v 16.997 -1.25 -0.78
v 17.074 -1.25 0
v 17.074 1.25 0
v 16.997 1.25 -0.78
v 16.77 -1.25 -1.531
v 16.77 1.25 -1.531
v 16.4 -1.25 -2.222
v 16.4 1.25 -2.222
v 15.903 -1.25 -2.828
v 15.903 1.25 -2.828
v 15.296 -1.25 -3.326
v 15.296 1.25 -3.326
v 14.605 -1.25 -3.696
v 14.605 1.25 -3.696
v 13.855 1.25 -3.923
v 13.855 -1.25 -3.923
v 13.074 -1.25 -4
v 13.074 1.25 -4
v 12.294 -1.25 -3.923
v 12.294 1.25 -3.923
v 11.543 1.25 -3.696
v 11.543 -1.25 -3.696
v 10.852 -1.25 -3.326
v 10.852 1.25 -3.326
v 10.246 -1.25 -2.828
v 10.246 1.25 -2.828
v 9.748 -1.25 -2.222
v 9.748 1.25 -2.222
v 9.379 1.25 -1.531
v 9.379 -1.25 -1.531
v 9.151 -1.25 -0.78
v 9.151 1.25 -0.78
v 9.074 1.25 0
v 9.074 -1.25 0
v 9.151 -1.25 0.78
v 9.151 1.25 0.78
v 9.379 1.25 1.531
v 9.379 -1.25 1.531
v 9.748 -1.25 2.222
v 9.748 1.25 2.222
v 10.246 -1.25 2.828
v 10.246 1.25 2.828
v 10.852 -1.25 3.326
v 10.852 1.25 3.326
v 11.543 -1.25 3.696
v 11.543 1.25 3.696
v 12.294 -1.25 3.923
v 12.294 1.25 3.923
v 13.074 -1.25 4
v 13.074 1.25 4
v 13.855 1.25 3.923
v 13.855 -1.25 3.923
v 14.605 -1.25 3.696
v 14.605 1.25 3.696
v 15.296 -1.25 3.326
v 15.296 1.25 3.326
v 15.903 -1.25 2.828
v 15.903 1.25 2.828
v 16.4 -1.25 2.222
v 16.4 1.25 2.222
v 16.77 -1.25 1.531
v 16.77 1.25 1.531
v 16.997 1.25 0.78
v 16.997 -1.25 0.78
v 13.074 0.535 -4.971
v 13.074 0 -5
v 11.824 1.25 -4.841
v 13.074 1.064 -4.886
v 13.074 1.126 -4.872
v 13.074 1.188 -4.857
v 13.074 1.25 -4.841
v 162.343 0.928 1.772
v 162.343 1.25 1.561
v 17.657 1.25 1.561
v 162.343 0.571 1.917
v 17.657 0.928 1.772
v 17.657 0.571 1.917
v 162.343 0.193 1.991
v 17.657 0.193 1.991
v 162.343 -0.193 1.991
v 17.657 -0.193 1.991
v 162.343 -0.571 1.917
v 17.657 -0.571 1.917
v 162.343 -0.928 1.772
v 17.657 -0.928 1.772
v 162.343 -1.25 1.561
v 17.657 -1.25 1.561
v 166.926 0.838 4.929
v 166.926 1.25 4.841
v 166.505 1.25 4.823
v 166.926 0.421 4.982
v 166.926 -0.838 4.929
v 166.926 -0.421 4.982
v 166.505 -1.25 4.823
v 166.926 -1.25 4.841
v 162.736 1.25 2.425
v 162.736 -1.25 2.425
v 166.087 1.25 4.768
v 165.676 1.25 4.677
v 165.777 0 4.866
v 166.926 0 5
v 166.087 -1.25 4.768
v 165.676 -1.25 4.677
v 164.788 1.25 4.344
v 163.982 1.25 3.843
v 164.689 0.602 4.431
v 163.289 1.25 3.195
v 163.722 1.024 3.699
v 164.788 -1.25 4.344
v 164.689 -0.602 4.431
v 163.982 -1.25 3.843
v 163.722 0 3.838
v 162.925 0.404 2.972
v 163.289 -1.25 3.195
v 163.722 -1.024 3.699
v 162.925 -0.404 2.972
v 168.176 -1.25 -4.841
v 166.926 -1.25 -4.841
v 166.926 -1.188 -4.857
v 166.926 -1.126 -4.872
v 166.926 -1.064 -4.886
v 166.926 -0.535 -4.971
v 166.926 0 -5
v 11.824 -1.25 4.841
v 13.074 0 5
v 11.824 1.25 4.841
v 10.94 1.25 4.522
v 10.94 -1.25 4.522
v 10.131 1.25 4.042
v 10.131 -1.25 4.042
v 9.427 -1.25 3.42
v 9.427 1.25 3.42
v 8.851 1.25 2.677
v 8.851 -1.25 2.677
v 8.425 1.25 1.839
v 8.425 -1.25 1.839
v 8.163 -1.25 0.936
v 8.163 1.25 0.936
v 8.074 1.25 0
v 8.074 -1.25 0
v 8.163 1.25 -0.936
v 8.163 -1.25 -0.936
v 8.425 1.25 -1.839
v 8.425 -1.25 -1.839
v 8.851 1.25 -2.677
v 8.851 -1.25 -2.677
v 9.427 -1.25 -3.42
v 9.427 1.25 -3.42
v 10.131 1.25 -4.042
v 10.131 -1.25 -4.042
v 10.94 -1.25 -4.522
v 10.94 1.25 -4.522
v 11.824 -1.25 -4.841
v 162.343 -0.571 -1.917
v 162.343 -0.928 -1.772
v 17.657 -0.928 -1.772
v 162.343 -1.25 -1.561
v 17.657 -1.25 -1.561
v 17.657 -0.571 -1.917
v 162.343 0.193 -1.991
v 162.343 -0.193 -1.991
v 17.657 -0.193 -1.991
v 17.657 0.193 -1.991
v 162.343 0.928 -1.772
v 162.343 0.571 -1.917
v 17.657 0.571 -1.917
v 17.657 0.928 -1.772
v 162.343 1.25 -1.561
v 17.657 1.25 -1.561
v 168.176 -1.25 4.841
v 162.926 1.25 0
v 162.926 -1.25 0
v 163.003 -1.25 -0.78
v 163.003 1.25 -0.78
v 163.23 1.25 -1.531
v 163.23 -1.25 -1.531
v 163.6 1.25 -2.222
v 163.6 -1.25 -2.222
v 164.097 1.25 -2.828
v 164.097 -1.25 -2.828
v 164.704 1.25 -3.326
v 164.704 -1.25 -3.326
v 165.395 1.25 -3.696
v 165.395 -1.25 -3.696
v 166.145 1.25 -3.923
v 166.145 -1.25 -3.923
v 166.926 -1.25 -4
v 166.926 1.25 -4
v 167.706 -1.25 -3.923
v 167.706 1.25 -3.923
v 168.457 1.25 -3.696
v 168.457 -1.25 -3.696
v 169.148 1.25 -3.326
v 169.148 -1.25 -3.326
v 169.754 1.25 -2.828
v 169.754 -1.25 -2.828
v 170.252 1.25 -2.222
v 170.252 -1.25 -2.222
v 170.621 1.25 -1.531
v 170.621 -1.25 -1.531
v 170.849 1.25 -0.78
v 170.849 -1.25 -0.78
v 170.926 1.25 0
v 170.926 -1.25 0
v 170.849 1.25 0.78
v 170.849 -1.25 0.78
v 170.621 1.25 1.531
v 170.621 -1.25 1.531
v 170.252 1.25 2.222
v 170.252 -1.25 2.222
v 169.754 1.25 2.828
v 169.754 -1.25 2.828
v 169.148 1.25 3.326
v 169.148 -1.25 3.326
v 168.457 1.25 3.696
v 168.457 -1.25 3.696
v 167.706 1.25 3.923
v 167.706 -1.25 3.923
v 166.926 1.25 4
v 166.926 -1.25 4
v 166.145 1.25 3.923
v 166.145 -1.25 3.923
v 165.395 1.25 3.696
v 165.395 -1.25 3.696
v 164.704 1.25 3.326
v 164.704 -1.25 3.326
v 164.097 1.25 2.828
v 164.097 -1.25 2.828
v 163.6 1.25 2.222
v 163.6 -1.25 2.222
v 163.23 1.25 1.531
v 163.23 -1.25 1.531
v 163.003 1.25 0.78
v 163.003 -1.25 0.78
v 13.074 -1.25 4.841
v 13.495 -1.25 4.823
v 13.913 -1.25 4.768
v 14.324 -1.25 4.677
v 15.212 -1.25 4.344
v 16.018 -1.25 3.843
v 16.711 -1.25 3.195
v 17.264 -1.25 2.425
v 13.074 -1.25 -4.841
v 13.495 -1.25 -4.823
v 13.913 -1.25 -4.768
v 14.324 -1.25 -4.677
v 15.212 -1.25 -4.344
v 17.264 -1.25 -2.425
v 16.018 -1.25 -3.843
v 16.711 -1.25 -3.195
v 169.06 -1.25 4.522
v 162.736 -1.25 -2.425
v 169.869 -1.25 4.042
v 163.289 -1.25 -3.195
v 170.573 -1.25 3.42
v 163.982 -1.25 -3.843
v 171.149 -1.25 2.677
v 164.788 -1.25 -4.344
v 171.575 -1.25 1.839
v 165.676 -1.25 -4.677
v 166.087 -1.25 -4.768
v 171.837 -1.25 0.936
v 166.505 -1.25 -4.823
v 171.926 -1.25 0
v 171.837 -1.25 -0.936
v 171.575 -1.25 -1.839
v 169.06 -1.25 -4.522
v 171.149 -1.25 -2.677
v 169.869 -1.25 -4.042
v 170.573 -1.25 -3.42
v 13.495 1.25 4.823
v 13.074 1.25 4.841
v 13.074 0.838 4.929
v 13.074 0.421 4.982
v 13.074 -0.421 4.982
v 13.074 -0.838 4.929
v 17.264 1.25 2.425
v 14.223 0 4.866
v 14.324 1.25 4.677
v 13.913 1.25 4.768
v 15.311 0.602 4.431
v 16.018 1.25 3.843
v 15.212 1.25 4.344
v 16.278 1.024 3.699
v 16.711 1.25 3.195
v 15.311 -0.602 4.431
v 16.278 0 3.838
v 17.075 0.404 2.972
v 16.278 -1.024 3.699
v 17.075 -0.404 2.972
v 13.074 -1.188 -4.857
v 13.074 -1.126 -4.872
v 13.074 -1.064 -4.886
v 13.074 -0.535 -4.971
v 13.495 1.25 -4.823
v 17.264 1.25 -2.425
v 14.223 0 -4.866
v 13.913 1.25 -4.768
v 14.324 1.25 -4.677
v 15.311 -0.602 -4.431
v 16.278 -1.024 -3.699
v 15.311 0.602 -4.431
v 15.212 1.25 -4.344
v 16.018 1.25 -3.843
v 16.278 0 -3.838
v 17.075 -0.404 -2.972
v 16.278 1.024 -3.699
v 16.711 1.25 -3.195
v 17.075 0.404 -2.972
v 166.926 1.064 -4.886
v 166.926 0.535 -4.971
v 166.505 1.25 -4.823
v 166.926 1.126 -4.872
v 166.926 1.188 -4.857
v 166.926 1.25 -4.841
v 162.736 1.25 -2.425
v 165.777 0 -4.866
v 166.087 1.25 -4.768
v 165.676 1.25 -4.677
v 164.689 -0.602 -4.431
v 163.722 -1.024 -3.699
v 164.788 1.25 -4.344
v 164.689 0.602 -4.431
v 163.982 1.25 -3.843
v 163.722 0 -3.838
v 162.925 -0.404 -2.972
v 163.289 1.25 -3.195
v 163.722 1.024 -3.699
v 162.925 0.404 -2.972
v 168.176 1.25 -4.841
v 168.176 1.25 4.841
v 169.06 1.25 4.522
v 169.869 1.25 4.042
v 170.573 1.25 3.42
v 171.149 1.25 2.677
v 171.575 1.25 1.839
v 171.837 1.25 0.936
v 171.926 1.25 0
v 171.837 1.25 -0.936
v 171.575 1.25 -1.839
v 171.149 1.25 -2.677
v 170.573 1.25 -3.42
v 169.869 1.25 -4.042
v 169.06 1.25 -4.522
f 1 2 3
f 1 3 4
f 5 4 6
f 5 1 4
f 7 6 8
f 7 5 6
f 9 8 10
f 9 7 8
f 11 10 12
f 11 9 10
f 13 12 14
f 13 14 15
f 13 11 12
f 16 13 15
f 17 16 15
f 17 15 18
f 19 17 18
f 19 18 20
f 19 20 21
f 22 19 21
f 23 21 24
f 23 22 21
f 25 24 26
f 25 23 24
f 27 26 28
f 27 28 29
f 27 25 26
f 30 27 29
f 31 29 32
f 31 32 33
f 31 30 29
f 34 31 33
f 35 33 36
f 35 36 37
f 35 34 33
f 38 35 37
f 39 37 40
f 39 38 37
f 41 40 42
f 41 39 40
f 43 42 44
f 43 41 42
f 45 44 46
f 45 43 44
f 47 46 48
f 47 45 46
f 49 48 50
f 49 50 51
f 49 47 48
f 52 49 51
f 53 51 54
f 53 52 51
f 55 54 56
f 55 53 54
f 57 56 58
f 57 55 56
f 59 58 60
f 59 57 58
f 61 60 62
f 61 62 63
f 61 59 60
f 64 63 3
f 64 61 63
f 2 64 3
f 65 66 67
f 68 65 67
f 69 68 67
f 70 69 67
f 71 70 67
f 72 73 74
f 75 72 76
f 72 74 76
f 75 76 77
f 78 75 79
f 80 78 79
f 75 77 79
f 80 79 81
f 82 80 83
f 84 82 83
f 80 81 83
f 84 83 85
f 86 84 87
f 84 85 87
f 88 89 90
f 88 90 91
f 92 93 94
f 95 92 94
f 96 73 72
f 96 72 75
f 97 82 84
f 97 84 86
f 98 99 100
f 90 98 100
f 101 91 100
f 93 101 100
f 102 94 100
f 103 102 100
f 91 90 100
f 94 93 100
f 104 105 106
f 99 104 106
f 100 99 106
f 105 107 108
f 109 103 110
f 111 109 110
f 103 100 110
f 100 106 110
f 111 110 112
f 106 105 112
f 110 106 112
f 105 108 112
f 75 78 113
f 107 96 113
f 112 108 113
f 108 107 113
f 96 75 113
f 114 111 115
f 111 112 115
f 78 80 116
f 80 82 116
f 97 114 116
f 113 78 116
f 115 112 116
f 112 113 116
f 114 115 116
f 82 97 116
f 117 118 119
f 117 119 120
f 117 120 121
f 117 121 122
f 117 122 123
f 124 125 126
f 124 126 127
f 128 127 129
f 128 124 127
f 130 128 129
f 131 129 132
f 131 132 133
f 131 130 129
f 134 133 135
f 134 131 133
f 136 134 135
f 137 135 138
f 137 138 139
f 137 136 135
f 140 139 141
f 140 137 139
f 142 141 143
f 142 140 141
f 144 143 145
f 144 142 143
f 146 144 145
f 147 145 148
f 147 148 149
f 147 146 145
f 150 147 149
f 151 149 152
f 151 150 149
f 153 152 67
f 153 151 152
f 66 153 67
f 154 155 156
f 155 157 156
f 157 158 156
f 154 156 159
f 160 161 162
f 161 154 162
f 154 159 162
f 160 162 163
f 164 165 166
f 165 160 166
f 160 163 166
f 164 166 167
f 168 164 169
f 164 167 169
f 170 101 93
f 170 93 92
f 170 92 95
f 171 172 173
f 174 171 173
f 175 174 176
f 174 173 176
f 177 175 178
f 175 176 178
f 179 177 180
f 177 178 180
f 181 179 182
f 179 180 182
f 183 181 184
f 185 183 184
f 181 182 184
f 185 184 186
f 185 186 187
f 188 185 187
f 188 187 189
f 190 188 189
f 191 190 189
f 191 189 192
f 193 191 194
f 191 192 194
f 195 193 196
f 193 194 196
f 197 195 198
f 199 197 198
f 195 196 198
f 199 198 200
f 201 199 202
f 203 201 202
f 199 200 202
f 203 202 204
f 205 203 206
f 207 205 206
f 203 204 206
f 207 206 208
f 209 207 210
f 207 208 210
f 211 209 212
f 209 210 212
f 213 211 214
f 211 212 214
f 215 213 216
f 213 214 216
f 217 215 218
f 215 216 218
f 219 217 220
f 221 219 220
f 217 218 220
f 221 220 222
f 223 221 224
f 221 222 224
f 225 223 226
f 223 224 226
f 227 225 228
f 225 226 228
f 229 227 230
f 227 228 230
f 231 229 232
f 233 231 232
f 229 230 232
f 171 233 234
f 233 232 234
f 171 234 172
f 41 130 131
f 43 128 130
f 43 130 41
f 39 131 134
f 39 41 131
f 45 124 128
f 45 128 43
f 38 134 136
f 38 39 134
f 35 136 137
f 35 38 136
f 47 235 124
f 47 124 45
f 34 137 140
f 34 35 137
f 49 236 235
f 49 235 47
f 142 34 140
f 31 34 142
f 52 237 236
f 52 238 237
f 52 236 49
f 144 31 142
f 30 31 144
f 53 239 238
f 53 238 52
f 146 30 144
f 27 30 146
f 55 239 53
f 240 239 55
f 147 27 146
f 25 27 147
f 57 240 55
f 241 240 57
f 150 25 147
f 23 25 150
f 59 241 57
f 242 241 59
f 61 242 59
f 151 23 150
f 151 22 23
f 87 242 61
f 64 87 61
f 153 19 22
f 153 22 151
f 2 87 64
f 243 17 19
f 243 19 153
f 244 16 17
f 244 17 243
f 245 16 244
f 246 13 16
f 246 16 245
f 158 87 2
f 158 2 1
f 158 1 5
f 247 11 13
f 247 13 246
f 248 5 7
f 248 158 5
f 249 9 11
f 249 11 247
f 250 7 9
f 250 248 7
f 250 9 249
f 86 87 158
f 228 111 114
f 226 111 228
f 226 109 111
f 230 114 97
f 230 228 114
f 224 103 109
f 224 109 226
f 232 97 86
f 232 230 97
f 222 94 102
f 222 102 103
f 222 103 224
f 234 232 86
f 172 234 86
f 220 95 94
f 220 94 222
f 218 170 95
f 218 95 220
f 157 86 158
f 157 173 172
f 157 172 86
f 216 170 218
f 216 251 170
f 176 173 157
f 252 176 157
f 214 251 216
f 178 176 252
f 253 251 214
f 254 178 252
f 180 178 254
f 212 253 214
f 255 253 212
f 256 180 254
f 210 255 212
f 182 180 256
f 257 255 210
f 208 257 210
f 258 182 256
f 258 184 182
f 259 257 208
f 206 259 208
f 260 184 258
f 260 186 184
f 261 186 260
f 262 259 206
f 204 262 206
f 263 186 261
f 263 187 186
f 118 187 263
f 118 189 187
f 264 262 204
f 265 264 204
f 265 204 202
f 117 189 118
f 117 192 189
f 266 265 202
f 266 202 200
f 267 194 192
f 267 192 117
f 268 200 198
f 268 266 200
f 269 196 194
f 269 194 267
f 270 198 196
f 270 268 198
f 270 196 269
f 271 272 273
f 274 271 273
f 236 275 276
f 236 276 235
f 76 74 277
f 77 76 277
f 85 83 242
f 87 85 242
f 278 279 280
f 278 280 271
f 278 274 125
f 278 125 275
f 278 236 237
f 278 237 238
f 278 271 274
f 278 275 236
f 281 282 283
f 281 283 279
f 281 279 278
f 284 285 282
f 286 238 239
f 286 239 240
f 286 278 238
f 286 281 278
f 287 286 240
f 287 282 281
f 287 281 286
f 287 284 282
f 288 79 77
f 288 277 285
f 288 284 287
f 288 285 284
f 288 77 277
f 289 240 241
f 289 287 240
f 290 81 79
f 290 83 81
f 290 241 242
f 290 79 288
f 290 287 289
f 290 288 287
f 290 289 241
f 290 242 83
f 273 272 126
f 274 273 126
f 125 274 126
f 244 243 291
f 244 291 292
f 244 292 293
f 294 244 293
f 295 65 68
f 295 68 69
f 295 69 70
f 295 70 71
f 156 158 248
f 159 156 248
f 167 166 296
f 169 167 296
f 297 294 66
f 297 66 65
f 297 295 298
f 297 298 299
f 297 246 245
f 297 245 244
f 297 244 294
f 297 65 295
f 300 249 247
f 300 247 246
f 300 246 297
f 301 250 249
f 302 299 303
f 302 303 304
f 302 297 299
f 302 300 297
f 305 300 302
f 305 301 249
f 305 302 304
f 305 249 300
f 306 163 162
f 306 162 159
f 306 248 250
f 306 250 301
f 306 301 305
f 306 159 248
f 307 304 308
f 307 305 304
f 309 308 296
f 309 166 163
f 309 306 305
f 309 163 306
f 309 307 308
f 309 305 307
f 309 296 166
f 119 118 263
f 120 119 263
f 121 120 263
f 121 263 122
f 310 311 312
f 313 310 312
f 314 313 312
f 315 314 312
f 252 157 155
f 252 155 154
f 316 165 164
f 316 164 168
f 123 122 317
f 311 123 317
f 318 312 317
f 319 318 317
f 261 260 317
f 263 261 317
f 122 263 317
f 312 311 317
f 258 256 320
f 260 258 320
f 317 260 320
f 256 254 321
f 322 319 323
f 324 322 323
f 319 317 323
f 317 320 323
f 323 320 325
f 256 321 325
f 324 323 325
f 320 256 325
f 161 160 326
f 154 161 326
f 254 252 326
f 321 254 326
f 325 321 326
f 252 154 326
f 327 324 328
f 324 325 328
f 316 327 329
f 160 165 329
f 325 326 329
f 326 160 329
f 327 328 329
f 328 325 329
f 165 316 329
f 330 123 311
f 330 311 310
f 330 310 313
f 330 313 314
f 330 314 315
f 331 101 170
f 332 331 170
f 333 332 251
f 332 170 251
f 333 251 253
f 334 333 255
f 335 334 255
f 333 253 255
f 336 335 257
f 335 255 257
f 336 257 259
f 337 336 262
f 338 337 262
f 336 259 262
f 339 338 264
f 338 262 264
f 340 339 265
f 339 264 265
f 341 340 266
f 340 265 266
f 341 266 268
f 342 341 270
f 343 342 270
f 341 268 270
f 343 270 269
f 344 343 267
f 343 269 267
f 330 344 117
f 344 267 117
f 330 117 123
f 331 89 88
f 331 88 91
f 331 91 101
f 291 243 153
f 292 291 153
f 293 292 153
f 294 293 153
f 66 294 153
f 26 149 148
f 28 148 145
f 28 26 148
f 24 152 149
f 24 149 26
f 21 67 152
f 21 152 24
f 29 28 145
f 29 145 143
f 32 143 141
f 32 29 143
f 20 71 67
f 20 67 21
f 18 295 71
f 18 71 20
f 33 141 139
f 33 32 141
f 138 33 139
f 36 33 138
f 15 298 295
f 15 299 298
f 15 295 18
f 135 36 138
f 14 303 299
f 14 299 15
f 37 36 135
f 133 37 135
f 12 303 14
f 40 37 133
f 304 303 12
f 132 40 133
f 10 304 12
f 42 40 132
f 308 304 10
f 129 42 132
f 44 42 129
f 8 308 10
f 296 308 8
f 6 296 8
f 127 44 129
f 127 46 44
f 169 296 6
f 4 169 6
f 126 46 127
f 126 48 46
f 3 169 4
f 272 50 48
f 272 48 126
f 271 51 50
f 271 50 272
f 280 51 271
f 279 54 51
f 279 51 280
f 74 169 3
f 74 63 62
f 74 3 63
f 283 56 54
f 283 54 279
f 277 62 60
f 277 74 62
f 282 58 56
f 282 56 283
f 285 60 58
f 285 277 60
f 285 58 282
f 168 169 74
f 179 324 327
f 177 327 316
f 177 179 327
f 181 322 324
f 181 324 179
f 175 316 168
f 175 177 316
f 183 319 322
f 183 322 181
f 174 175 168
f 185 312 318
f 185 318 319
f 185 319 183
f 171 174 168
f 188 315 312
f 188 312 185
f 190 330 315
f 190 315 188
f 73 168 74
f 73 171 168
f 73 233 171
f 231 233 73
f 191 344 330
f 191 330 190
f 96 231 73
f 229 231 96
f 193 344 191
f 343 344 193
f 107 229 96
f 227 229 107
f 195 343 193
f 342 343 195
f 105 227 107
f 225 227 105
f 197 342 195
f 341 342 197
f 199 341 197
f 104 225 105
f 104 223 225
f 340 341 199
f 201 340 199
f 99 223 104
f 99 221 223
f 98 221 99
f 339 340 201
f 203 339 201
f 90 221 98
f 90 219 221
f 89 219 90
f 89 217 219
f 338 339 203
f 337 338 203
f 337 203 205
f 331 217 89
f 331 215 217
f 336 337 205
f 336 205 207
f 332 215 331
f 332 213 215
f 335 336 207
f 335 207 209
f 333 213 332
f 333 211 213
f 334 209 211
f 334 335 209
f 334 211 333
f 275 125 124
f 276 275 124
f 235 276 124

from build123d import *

# Parameters (mm, degrees)
EXTRUDE_1_DEPTH         = 180
CUT_EXTRUDE_START       = -1.25
CUT_EXTRUDE_1_OUTLINE_W = 200.912361756
CUT_EXTRUDE_1_OUTLINE_H = 41.35790762
CUT_EXTRUDE_1_OUTLINE_R = 4
CUT_EXTRUDE_1_DEPTH     = 2.5


# Read off the part's stored shape, not the designer's step: 切除-拉伸1
with BuildPart() as part:
    # 草图2 → 凸台-拉伸1 (new body)
    with BuildSketch(Plane(origin=(0, 0, 0), x_dir=(0, 0, -1), z_dir=(1, 0, 0))):
        with BuildLine():
            Line((4.841229183, 1.25), (0, 1.25))
            Line((0, 1.25), (0, -1.25))
            Line((0, -1.25), (4.841229183, -1.25))
            ThreePointArc((4.841229183, -1.25), (4.960148481, -0.630021462), (5, 0))
            ThreePointArc((5, 0), (4.960148481, 0.630021462), (4.841229183, 1.25))
        make_face()
        with BuildLine():
            Line((0, -1.25), (0, 1.25))
            Line((0, 1.25), (-4.841229183, 1.25))
            ThreePointArc((-4.841229183, 1.25), (-5, 0), (-4.841229183, -1.25))
            Line((-4.841229183, -1.25), (0, -1.25))
        make_face()
    extrude(amount=EXTRUDE_1_DEPTH)

    # 切除-拉伸1 outline → 切除-拉伸1 (cut)
    # profile 1 of 2: a face of its own
    with BuildSketch(Plane(origin=(0, 0, 0), x_dir=(1, 0, 0), z_dir=(0, 1, 0)).offset(CUT_EXTRUDE_START)):
        with Locations((92.35420838, -2.241239646)):
            Rectangle(CUT_EXTRUDE_1_OUTLINE_W, CUT_EXTRUDE_1_OUTLINE_H)
        with BuildLine():
            Line((90, 5), (90, -5))
            Line((90, -5), (13.074176, -5))
            ThreePointArc((13.074176, -5), (8.074176, 0), (13.074176, 5))
            Line((13.074176, 5), (90, 5))
        make_face(mode=Mode.SUBTRACT)
    # profile 2 of 2: a face of its own
    with BuildSketch(Plane(origin=(0, 0, 0), x_dir=(1, 0, 0), z_dir=(0, 1, 0)).offset(CUT_EXTRUDE_START)):
        with Locations((13.074176, 0)):
            Circle(CUT_EXTRUDE_1_OUTLINE_R)
    extrude(amount=CUT_EXTRUDE_1_DEPTH, mode=Mode.SUBTRACT)

    # 草图4 → 切除-旋转3 (revolve, cut)
    with BuildSketch(Plane(origin=(0, 0, 0), x_dir=(1, 0, 0), z_dir=(0, 1, 0))):
        with BuildLine():
            Line((17.656751695, 2), (93.188618098, 2))
            Line((93.188618098, 2), (93.188618098, 5))
            Line((93.188618098, 5), (13.074176, 5))
            ThreePointArc((13.074176, 5), (15.812788788, 4.183300133), (17.656751695, 2))
        make_face()
        with BuildLine():
            Line((93.188618098, -4.841229183), (93.188618098, -2))
            Line((93.188618098, -2), (17.656751695, -2))
            ThreePointArc((17.656751695, -2), (16.318074985, -3.804880993), (14.324176, -4.841229183))
            Line((14.324176, -4.841229183), (93.188618098, -4.841229183))
        make_face()
    revolve(axis=Axis((18.074176, 0, 0), (1, 0, 0)), mode=Mode.SUBTRACT)

    # 镜向1: part across plane


with BuildPart() as part_1:
    add(part.part)
    add(part.part.mirror(Plane(origin=(90, 170, 0), x_dir=(0, 0, 1), z_dir=(1, 0, 0))))


solid = part_1.part
